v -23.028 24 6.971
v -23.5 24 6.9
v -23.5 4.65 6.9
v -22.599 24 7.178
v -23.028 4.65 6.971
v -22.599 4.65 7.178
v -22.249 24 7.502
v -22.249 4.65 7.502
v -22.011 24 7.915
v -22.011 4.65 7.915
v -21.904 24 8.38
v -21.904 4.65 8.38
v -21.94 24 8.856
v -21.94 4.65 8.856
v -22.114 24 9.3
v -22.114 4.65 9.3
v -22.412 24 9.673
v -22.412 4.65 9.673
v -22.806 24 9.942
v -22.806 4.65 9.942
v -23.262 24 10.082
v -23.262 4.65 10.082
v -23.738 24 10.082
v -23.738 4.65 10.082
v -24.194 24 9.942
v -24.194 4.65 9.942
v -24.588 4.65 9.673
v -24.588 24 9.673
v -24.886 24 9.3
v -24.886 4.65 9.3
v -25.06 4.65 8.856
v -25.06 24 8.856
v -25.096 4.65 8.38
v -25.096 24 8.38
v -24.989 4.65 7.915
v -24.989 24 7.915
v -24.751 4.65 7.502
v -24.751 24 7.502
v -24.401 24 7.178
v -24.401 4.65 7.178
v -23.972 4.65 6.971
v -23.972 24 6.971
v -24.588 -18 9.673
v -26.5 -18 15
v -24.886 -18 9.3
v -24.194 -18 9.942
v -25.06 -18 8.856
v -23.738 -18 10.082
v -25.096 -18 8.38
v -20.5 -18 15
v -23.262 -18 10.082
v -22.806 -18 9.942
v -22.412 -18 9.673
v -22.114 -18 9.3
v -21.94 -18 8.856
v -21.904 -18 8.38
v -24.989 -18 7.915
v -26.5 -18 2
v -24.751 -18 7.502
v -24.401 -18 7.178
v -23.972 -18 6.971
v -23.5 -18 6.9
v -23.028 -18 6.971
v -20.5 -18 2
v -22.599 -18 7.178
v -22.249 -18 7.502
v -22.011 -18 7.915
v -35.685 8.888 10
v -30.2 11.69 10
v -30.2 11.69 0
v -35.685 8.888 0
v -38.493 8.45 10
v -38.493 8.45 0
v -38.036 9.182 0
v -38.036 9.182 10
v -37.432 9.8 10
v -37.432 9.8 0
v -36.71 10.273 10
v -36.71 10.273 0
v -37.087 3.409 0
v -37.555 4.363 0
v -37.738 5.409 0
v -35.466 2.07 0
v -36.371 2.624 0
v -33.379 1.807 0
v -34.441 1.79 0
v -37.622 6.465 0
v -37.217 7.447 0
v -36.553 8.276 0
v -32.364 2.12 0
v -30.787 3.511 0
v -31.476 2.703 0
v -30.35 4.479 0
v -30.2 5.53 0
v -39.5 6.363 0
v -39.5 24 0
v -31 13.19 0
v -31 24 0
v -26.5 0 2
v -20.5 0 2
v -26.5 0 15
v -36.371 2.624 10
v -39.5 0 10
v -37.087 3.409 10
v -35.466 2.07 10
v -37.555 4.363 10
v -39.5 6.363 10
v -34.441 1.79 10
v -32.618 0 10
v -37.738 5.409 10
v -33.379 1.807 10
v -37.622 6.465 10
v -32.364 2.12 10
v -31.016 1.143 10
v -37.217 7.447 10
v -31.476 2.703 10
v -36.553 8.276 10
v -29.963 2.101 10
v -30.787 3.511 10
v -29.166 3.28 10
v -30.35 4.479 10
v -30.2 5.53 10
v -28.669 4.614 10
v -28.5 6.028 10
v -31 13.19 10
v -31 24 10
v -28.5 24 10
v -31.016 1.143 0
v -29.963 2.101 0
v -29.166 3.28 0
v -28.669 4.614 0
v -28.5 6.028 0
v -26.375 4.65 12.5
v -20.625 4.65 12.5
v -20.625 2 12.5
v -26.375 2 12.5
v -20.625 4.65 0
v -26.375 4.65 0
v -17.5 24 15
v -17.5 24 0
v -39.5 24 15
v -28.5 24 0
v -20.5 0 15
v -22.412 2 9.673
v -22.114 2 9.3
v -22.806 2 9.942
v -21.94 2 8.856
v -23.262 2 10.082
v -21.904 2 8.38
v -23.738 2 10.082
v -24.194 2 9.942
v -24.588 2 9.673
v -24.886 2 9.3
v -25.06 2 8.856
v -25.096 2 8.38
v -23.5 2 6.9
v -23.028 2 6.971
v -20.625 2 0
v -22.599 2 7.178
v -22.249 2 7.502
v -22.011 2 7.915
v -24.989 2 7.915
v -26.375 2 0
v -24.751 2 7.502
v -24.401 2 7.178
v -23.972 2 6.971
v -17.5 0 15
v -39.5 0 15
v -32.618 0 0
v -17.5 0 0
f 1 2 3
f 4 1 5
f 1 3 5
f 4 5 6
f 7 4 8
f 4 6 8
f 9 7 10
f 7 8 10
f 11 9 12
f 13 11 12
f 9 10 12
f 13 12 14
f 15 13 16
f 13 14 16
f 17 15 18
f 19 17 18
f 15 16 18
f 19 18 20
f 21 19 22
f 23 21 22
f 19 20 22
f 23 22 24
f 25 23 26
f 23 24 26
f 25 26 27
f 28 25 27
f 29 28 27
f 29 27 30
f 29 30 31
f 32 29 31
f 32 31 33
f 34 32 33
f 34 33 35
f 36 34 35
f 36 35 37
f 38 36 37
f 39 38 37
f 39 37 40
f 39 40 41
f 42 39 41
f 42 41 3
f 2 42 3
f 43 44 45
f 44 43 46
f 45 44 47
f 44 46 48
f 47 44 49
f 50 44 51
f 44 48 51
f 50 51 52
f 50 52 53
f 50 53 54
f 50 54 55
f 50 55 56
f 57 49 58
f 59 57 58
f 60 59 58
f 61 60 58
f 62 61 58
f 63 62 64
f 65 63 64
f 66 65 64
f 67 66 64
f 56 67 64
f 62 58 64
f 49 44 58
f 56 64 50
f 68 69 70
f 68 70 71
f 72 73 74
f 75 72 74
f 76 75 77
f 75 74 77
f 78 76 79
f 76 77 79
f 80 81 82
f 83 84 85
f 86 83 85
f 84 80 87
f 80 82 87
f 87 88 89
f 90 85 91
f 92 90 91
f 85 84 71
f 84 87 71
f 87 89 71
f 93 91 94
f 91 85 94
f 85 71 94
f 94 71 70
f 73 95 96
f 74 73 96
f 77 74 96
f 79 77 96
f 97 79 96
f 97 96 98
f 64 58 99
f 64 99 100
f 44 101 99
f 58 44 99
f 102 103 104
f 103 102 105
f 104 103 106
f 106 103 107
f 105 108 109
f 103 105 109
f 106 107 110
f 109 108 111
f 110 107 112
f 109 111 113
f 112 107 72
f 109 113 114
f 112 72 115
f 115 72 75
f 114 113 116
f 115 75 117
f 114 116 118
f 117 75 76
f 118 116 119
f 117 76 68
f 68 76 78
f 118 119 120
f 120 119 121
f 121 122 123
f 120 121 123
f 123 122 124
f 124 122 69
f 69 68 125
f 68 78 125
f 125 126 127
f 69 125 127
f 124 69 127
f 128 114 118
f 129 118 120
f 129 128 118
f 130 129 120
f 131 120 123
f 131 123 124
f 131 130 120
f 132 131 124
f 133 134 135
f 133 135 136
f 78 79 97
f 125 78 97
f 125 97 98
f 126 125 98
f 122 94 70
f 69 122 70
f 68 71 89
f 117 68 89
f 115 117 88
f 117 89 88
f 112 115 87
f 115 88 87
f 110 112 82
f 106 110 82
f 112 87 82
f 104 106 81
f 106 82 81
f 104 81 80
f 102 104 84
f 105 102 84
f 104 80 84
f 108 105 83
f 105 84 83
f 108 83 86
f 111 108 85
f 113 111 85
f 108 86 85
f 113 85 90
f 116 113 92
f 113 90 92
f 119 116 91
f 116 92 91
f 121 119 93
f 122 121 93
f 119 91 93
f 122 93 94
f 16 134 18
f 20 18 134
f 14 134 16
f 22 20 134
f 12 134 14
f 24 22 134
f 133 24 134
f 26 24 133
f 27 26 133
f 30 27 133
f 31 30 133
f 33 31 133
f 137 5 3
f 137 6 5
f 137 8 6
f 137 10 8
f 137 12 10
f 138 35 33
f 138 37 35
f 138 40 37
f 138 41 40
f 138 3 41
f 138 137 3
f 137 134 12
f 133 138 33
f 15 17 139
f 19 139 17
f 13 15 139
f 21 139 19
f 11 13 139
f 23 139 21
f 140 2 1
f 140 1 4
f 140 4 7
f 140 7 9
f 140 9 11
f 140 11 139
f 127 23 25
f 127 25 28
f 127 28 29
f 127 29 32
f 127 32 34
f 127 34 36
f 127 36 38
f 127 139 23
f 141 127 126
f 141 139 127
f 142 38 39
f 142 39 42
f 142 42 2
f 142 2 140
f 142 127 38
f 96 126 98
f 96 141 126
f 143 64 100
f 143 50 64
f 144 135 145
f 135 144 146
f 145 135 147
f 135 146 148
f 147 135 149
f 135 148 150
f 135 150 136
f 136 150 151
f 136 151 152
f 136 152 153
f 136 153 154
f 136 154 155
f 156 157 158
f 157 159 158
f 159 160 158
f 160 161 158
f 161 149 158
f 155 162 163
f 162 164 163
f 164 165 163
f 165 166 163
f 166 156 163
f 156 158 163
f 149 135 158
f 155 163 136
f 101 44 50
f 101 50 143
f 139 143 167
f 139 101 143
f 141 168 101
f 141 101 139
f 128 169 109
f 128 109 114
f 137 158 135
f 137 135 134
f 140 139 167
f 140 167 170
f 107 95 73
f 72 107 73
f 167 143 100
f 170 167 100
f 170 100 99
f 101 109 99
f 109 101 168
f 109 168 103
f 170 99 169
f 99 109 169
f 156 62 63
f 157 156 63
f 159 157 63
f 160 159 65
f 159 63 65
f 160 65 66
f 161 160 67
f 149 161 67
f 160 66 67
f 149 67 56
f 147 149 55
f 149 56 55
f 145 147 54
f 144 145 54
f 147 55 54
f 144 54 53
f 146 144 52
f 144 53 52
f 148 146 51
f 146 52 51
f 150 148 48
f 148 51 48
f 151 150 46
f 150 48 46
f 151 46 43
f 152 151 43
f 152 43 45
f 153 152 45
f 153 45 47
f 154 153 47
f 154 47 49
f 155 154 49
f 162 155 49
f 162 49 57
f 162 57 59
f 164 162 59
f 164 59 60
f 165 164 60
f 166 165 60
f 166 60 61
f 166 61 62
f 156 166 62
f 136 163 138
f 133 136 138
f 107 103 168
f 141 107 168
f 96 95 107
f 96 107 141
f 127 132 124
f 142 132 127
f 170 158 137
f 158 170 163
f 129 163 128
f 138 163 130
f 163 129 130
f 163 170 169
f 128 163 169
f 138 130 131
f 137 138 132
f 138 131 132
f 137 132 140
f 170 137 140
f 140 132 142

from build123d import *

# Parameters (mm, degrees)
BOSS_EXTRUDE1_DEPTH   = 10
BOSS_EXTRUDE1_2_DEPTH = 10
BOSS_EXTRUDE1_3_DEPTH = 10
SKETCH3_W             = 13
SKETCH3_H             = 24
BOSS_EXTRUDE2_DEPTH   = 5
SKETCH4_W             = 6
SKETCH4_H             = 13
BOSS_EXTRUDE3_DEPTH   = 42
SKETCH5_W             = 6
SKETCH5_H             = 24
BOSS_EXTRUDE4_DEPTH   = 2
SKETCH6_R             = 1.6
CUT_EXTRUDE1_DEPTH    = 60.575582246
SKETCH8_W             = 15
SKETCH8_H             = 24
BOSS_EXTRUDE5_DEPTH   = 3
SKETCH7_W             = 5.75
SKETCH7_H             = 2.65
CUT_EXTRUDE2_DEPTH    = 12.5


with BuildPart() as part:
    # Sketch2 → Boss-Extrude1 (new body)
    with BuildSketch(Plane.XY):
        with BuildLine():
            Line((-26.5, 0), (-30.65, 0))
            Line((-30.65, 0), (-32.618157491, 0))
            Line((-32.618157491, 0), (-31.015837104, 1.142896884))
            ThreePointArc((-31.015837104, 1.142896884), (-29.165912572, 3.280355677), (-28.5, 6.027629109))
            Line((-28.5, 6.027629109), (-28.5, 24))
            Line((-28.5, 24), (-26.5, 24))
            Line((-26.5, 24), (-26.5, 0))
        make_face()
    extrude(amount=BOSS_EXTRUDE1_DEPTH)



with BuildPart() as body_2:
    # Sketch2 → Boss-Extrude1 2 (new body)
    with BuildSketch(Plane.XY):
        with BuildLine():
            Line((-31, 24), (-39.5, 24))
            Line((-39.5, 24), (-39.5, 8.68))
            Line((-39.5, 8.68), (-39.5, 6.362551494))
            Line((-39.5, 6.362551494), (-38.492686138, 8.449627525))
            ThreePointArc((-38.492686138, 8.449627525), (-37.750547948, 9.507229314), (-36.71, 10.273095232))
            Line((-36.71, 10.273095232), (-31, 13.19))
            Line((-31, 13.19), (-31, 24))
        make_face()
    extrude(amount=BOSS_EXTRUDE1_2_DEPTH)


with BuildPart() as body_3:
    # Sketch2 → Boss-Extrude1 3 (new body)
    with BuildSketch(Plane.XY):
        with BuildLine():
            Line((-30.2, 5.530404879), (-30.2, 11.689701848))
            Line((-30.2, 11.689701848), (-35.685050881, 8.887710417))
            ThreePointArc((-35.685050881, 8.887710417), (-35.938141024, 2.314923436), (-30.2, 5.530404879))
        make_face()
    extrude(amount=BOSS_EXTRUDE1_3_DEPTH)


with BuildPart() as part_1:
    add(part.part)

    add(body_2.part)  # Boss-Extrude2 merges body 2

    add(body_3.part)  # Boss-Extrude2 merges body 3
    # Sketch3 → Boss-Extrude2 (add)
    with BuildSketch(Plane.XY.offset(10)):
        with Locations((-33, 12)):
            Rectangle(SKETCH3_W, SKETCH3_H)
    extrude(amount=BOSS_EXTRUDE2_DEPTH)

    # Sketch4 → Boss-Extrude3 (add)
    with BuildSketch(Plane(origin=(0, 24, 0), x_dir=(1, 0, 0), z_dir=(0, 1, 0))):
        with Locations((-23.5, -8.5)):
            Rectangle(SKETCH4_W, SKETCH4_H)
    extrude(amount=-BOSS_EXTRUDE3_DEPTH)

    # Sketch5 → Boss-Extrude4 (add)
    with BuildSketch(Plane(origin=(0, 0, 2), x_dir=(-1, 0, 0), z_dir=(0, 0, -1))):
        with Locations((23.5, 12)):
            Rectangle(SKETCH5_W, SKETCH5_H)
    extrude(amount=BOSS_EXTRUDE4_DEPTH)

    # Sketch6 → Cut-Extrude1 (cut, through all)
    with BuildSketch(Plane.XZ.offset(18)):
        with Locations(Location((-23.5, 8.5, 0), (0, 0, 270))):
            Circle(SKETCH6_R)
    extrude(amount=-CUT_EXTRUDE1_DEPTH, mode=Mode.SUBTRACT)

    # Sketch8 → Boss-Extrude5 (add)
    with BuildSketch(Plane(origin=(-20.5, 0, 0), x_dir=(0, 0, -1), z_dir=(1, 0, 0))):
        with Locations((-7.5, 12)):
            Rectangle(SKETCH8_W, SKETCH8_H)
    extrude(amount=BOSS_EXTRUDE5_DEPTH)

    # Sketch7 → Cut-Extrude2 (cut)
    with BuildSketch(Plane(origin=(0, 0, 0), x_dir=(-1, 0, 0), z_dir=(0, 0, -1))):
        with Locations((23.5, 3.325)):
            Rectangle(SKETCH7_W, SKETCH7_H)
    extrude(amount=-CUT_EXTRUDE2_DEPTH, mode=Mode.SUBTRACT)


solid = part_1.part
